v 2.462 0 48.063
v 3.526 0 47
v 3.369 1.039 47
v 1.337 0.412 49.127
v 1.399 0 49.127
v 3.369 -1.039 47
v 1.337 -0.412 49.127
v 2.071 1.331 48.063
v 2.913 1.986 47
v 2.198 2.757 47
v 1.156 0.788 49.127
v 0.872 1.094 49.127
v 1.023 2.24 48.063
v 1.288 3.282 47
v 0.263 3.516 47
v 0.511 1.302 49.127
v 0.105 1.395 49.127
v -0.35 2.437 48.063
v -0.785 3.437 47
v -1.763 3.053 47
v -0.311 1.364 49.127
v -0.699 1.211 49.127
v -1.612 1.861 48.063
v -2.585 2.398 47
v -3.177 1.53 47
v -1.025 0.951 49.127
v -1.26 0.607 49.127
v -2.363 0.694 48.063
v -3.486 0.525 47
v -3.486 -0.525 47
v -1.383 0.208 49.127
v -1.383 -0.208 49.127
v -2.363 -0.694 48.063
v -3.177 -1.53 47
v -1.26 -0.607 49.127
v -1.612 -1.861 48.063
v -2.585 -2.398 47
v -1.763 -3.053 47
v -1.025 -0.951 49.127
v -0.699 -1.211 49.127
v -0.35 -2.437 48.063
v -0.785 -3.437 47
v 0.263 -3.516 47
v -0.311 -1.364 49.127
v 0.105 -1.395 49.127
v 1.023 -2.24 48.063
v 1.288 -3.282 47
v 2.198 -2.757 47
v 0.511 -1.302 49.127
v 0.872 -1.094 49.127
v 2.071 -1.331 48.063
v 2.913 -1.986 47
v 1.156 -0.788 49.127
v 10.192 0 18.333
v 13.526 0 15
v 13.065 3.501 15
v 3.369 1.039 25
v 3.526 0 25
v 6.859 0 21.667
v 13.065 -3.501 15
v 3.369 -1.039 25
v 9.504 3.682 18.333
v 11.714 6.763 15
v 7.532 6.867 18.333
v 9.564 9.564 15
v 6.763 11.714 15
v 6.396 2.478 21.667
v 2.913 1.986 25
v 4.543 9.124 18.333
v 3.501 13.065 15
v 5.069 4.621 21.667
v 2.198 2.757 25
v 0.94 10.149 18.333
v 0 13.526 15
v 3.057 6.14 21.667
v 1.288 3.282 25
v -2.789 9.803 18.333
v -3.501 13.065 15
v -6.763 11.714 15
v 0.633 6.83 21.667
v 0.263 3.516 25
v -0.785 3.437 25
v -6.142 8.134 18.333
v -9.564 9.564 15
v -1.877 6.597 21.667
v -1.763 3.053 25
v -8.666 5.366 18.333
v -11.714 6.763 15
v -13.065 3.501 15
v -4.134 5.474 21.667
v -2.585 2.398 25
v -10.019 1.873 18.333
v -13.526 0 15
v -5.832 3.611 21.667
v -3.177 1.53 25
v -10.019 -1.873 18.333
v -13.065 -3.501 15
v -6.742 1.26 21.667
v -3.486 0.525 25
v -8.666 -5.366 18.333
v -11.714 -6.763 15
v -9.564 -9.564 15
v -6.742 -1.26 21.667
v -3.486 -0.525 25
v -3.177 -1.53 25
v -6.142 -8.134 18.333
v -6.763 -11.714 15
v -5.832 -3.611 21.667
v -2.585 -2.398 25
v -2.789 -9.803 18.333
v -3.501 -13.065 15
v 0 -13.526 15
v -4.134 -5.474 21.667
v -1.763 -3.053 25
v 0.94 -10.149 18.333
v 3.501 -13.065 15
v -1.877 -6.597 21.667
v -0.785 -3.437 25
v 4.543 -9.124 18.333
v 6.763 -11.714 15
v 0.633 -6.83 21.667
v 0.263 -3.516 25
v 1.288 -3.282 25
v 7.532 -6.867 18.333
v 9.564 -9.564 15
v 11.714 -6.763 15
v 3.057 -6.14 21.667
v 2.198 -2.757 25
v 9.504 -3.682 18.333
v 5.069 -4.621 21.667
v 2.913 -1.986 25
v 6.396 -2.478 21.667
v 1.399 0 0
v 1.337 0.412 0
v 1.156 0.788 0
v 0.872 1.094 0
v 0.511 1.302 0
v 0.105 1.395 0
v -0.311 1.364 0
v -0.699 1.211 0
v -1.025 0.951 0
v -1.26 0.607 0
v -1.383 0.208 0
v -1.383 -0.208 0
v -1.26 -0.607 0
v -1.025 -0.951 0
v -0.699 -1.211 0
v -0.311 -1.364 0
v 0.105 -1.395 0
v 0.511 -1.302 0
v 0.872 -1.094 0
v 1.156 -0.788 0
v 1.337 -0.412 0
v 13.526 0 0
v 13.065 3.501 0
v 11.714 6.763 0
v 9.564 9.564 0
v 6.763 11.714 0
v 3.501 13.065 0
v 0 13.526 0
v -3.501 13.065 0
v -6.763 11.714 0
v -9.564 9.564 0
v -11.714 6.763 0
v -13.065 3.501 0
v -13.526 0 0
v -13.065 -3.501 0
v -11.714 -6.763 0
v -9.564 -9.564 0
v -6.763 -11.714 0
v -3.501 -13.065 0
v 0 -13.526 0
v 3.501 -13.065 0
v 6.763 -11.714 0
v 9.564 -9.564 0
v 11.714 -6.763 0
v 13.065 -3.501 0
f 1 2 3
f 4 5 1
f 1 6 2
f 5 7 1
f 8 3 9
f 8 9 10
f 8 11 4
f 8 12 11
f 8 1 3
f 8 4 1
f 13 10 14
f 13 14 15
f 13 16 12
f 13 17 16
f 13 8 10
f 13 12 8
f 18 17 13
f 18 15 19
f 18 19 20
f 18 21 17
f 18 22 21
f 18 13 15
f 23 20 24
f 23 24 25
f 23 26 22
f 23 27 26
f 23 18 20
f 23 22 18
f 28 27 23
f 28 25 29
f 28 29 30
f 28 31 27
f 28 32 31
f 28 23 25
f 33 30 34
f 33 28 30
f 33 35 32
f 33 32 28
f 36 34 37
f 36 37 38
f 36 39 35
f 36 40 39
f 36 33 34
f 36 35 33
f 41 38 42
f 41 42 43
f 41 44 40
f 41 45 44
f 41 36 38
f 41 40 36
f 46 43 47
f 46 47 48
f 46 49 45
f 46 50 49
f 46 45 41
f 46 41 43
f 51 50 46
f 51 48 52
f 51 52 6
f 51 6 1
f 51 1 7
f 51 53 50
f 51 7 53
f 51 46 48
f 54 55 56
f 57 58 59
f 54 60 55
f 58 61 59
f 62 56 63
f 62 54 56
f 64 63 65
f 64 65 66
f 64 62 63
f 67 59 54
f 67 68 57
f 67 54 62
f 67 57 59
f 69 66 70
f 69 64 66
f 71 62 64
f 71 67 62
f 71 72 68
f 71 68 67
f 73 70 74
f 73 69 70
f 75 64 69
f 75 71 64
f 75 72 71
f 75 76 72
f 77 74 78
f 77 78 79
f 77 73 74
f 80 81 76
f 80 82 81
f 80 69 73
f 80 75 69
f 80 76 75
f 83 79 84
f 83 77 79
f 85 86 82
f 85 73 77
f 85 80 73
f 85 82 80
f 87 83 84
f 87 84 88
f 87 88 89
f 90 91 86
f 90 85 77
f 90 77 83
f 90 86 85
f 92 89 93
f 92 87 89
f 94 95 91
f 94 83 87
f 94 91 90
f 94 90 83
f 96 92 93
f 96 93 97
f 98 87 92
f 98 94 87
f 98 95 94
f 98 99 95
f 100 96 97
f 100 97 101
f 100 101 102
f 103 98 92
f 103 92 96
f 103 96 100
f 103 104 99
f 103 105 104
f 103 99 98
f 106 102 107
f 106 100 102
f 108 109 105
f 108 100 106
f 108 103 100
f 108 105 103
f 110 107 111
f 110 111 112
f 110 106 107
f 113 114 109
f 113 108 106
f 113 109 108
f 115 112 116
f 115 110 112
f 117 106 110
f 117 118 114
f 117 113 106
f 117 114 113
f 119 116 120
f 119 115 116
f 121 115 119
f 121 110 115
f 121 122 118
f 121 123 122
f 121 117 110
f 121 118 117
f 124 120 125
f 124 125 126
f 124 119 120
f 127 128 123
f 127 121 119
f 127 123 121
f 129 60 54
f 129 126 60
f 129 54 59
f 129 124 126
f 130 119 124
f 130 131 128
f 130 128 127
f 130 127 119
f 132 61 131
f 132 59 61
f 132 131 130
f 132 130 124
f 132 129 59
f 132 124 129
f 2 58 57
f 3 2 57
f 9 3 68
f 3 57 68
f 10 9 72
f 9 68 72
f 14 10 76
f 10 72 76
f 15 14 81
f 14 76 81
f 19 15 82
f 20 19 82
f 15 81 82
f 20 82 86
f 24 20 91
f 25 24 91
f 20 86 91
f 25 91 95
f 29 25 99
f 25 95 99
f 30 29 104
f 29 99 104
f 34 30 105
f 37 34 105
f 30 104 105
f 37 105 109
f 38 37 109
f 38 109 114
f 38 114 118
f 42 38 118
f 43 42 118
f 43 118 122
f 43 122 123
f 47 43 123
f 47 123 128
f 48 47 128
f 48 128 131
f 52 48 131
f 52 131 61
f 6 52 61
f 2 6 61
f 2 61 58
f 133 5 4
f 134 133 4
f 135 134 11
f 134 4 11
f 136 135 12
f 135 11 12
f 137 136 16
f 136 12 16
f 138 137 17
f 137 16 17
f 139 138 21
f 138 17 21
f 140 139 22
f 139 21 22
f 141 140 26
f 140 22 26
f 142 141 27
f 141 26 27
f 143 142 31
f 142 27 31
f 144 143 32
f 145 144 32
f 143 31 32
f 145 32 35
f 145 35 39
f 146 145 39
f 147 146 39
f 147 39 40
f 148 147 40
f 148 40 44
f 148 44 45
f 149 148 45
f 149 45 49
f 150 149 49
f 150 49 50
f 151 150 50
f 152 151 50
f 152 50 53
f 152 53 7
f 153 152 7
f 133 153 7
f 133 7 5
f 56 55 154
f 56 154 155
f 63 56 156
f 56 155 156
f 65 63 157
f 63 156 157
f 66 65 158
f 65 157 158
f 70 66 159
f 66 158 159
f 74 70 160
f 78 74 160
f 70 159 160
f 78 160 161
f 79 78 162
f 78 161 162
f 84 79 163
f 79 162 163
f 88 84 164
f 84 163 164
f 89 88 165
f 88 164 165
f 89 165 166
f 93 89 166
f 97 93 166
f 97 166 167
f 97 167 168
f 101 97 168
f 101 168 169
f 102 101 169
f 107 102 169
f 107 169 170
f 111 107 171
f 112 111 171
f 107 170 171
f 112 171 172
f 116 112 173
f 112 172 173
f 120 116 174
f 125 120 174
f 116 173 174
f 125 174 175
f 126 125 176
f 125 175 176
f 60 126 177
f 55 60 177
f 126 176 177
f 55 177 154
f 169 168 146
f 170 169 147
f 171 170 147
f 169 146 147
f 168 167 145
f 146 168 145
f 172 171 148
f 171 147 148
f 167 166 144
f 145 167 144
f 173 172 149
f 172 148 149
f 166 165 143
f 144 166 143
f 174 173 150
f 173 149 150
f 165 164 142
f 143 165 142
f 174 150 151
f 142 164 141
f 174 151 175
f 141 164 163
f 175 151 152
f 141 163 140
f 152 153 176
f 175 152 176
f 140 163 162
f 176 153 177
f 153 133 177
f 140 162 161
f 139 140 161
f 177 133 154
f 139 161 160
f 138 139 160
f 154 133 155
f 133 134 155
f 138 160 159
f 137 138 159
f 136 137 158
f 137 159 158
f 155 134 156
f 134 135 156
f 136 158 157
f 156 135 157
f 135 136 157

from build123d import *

# Parameters (mm, degrees)
F0_R     = 13.5257644579
F1_DEPTH = 25
F2_SIZE  = 10
F3_DEPTH = 25
F4_R     = 1.3988438113
F5_DEPTH = 100


# Not quite as in the source:
# - a fillet or chamfer that OpenCascade refuses, or shapes differently, is made with other operations: its cross-section is extruded or revolved along the edge and cut away or added


with BuildPart() as f1:
    # F0 (on Top) → F1 (new body)
    with BuildSketch(Plane.XY):
        Circle(F0_R)
    extrude(amount=F1_DEPTH)

    # F2
    f2_edges = [f1.edges().sort_by_distance(p)[0] for p in [
        (-13.525764, 0, 25),
    ]]
    chamfer(f2_edges, length=F2_SIZE)

    # F3 (add): a face of the model
    f3_faces = [f1.faces().sort_by_distance(p)[0] for p in [
        (0, 0, 25),
    ]]
    extrude(f3_faces, amount=F3_DEPTH)

    # F4 (on face) → F5 (cut)
    with BuildSketch(Plane.XY.offset(50)):
        Circle(F4_R)
    extrude(amount=-F5_DEPTH, mode=Mode.SUBTRACT)

    # F6: chamfer of 3 on 1 edges, made by hand

    # F6_s1 → F6_t2 (revolve, cut)
    with BuildSketch(Plane.XZ):
        Polygon((3.5257644579, 47), (0.5257644579, 50), (3.5257644579, 50), align=None)
    revolve(axis=Axis((0, 0, 50), (0, 0, 1)), mode=Mode.SUBTRACT)


solid = f1.part
